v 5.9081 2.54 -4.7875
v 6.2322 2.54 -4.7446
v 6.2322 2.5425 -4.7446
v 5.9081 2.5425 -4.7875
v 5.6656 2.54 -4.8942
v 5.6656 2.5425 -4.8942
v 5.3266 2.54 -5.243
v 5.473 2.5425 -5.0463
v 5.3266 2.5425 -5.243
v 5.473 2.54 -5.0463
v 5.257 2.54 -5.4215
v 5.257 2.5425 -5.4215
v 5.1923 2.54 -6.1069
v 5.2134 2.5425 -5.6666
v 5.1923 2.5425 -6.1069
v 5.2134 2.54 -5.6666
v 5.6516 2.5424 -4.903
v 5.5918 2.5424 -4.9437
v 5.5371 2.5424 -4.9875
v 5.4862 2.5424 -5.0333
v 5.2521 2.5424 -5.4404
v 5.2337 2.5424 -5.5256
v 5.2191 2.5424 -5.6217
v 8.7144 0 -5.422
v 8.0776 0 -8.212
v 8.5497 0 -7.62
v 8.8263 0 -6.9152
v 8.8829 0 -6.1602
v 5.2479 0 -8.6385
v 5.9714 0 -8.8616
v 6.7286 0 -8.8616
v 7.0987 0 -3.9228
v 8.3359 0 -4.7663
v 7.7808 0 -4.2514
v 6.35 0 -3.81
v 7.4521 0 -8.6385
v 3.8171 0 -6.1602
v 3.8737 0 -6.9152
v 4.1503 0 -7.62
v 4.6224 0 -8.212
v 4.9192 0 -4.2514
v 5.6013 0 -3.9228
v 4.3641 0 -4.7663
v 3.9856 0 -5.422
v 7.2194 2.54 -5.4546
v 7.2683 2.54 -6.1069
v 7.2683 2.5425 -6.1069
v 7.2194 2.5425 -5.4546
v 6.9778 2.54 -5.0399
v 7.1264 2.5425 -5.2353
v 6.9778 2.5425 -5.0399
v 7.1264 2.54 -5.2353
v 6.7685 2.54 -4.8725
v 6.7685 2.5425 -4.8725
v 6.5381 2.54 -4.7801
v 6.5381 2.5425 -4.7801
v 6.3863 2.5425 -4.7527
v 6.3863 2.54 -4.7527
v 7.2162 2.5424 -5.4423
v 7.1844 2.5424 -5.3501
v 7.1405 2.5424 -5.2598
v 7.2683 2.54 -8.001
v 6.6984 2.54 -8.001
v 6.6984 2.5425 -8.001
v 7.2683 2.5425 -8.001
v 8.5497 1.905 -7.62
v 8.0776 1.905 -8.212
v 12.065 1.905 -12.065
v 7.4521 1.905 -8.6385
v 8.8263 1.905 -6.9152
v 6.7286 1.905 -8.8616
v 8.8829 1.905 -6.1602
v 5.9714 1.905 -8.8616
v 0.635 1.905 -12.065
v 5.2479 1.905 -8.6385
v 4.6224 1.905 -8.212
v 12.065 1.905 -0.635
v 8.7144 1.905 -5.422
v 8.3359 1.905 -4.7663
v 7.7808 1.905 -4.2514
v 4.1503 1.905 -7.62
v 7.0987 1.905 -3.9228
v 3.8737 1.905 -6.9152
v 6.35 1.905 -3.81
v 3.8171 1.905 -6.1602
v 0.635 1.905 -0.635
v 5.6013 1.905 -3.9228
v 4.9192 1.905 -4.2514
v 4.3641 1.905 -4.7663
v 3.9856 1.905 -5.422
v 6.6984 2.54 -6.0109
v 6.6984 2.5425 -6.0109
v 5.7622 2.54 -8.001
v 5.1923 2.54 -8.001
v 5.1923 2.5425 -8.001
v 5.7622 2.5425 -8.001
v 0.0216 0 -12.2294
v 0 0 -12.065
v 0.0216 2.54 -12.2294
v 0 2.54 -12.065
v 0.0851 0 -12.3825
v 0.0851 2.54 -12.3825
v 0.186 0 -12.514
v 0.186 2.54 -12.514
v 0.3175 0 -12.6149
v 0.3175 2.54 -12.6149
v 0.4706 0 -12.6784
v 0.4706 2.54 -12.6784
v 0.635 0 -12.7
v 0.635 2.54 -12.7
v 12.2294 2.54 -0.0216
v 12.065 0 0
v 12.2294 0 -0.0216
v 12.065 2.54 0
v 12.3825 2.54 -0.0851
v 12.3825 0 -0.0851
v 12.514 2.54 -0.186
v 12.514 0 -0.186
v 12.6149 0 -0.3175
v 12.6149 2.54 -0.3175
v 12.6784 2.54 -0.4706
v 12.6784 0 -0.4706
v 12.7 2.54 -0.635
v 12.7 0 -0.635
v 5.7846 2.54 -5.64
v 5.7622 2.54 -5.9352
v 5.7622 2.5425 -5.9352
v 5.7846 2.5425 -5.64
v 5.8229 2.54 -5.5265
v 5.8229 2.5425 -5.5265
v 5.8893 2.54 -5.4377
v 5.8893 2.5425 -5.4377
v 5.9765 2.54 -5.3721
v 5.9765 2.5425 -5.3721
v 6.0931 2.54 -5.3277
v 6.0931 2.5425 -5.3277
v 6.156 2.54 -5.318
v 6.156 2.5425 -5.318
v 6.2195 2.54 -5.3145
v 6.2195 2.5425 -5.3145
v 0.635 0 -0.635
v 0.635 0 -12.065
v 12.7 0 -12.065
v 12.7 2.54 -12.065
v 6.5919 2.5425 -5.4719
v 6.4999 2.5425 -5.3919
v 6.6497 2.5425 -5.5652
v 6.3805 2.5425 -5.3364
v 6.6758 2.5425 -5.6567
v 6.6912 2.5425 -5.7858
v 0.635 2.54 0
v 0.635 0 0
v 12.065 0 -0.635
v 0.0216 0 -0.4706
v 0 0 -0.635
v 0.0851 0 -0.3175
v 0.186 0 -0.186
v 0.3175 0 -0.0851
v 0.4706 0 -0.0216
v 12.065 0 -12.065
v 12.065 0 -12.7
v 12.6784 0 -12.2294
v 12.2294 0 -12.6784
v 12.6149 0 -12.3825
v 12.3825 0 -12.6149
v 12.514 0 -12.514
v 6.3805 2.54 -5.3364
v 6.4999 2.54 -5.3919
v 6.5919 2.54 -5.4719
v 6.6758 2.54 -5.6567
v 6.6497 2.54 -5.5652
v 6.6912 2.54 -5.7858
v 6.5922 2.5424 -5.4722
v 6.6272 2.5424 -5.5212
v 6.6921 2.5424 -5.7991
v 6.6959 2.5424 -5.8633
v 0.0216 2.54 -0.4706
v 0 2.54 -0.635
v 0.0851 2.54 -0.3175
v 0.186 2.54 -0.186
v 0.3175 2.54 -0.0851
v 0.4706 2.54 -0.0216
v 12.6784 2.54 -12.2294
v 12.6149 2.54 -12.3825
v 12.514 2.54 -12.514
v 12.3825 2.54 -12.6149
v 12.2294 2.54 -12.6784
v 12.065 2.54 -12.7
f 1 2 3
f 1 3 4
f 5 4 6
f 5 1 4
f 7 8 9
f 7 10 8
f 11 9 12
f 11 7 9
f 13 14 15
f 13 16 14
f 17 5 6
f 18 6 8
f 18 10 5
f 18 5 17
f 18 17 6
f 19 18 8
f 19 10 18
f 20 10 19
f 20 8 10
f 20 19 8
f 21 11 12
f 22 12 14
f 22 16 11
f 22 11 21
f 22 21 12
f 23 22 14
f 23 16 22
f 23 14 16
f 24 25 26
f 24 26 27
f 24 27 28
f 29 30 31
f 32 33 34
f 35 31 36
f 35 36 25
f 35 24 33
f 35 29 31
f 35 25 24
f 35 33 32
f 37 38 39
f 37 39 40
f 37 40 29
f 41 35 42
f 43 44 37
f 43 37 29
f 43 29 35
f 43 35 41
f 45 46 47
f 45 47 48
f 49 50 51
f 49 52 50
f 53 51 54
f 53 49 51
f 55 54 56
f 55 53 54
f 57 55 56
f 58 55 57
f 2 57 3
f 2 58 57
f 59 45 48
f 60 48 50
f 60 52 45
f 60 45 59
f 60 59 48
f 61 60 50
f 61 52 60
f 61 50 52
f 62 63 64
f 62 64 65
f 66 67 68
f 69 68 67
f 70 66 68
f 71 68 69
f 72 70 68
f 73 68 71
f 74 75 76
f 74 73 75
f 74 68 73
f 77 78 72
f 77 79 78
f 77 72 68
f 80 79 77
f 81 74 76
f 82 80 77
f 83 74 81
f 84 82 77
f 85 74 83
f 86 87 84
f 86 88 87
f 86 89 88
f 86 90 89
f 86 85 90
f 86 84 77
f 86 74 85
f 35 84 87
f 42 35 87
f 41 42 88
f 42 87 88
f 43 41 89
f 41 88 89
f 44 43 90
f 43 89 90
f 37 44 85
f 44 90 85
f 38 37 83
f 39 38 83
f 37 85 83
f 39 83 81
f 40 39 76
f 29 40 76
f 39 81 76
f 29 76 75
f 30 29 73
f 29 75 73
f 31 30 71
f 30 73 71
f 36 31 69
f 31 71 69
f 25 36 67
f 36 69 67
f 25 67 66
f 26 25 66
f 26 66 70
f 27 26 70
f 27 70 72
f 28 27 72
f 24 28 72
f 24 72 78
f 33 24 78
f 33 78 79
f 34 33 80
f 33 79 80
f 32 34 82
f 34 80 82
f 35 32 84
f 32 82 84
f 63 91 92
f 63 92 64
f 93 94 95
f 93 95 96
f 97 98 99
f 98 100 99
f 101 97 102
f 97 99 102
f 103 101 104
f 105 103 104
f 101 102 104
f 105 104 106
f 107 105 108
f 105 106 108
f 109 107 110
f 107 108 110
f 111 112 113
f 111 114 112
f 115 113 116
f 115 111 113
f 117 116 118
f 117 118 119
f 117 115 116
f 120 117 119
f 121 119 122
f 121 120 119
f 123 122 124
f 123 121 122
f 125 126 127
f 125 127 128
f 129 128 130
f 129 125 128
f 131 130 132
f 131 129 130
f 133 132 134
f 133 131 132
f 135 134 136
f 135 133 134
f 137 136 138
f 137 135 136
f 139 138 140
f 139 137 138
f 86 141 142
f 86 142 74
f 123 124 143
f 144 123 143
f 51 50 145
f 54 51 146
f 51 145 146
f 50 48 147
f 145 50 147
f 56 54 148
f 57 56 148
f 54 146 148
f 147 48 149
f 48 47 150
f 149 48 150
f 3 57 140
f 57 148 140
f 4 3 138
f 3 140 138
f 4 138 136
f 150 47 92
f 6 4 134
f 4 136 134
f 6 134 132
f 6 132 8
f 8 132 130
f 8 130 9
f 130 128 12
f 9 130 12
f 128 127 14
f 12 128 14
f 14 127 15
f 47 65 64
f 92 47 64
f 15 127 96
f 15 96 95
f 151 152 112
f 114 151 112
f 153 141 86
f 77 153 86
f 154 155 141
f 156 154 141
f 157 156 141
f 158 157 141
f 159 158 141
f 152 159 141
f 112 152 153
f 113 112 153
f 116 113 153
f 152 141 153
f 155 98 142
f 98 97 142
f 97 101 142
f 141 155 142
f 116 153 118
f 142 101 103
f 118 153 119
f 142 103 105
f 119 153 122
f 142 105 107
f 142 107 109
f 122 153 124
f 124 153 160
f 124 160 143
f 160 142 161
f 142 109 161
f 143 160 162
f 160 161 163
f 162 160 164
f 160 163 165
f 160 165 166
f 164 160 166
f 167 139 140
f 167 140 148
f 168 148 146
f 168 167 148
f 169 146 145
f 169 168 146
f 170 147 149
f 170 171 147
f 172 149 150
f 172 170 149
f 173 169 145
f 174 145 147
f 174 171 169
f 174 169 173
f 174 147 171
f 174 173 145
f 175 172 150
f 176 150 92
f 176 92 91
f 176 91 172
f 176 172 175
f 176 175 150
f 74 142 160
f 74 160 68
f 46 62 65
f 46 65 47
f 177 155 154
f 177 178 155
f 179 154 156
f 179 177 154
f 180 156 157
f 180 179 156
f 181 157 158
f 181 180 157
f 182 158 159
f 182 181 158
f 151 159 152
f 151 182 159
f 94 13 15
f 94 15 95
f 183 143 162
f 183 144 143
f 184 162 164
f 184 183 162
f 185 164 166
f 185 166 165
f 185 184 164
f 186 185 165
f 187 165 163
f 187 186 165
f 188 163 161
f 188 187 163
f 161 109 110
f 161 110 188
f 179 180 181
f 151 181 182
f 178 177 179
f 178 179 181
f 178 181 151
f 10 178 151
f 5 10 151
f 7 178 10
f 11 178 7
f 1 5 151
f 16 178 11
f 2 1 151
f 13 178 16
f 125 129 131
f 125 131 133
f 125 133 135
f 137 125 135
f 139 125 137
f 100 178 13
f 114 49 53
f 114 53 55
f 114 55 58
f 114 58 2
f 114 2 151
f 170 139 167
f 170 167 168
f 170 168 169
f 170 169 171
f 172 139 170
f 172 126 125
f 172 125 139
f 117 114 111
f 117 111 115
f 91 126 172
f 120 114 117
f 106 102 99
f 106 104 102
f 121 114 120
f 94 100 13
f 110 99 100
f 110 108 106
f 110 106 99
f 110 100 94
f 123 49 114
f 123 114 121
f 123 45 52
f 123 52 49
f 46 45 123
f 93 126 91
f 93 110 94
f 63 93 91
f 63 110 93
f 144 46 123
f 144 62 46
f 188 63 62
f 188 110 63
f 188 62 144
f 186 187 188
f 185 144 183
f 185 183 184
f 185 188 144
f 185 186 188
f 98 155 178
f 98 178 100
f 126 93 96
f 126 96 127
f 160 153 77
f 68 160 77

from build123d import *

# Parameters (mm, degrees)
SKETCH1_W           = 12.7
SKETCH1_H           = 12.7
BOSS_EXTRUDE1_DEPTH = 2.54
FILLET1_R           = 0.635
SHELL1_START        = 0.635
SHELL1_OUTLINE_W    = 1.905
SHELL1_OUTLINE_H    = 11.43
SHELL1_DEPTH        = 11.43
SKETCH2_R           = 2.54
BOSS_EXTRUDE2_DEPTH = 1.905
BOSS_EXTRUDE3_DEPTH = 0.00254


# Read off the part's stored shape, not the designer's step: Shell1
with BuildPart() as part:
    # Sketch1 → Boss-Extrude1 (new body)
    with BuildSketch(Plane(origin=(0, 0, 0), x_dir=(1, 0, 0), z_dir=(0, 1, 0))):
        with Locations((6.35, 6.35)):
            Rectangle(SKETCH1_W, SKETCH1_H)
    extrude(amount=BOSS_EXTRUDE1_DEPTH)

    # Fillet1
    fillet1_edges = [part.edges().sort_by_distance(p)[0] for p in [
        (0, 1.27, -12.7),
        (12.7, 1.27, -12.7),
        (12.7, 1.27, 0),
        (0, 1.27, 0),
    ]]
    fillet(fillet1_edges, radius=FILLET1_R)

    # Shell1 outline → Shell1 (cut)
    with BuildSketch(Plane.YZ.offset(SHELL1_START)):
        with Locations((0.9525, -6.35)):
            Rectangle(SHELL1_OUTLINE_W, SHELL1_OUTLINE_H)
    extrude(amount=SHELL1_DEPTH, mode=Mode.SUBTRACT)

    # Sketch2 → Boss-Extrude2 (add)
    with BuildSketch(Plane(origin=(0, 1.905, 0), x_dir=(-1, 0, 0), z_dir=(0, -1, 0))):
        with Locations(Location((-6.35, 6.35, 0), (0, 0, 270))):
            Circle(SKETCH2_R)
    extrude(amount=BOSS_EXTRUDE2_DEPTH)

    # Sketch3 → Boss-Extrude3 (add)
    with BuildSketch(Plane(origin=(0, 2.54, 0), x_dir=(1, 0, 0), z_dir=(0, 1, 0))):
        with BuildLine():
            Line((5.192346154, 8.001), (5.762217949, 8.001))
            Line((5.762217949, 8.001), (5.762217949, 5.935214744))
            add(Edge.make_bspline(
                [(5.762217949, 5.935214744), (5.762248936, 5.913797578), (5.762308786, 5.872430544), (5.765304944, 5.813082394), (5.768046636, 5.758529018), (5.772993425, 5.70883014), (5.780301528, 5.663964501), (5.787378157, 5.6236439), (5.796955674, 5.588590232), (5.811349151, 5.54868998), (5.833524775, 5.503859868), (5.869758513, 5.457136896), (5.911569146, 5.414495403), (5.961681599, 5.37900224), (6.018003565, 5.35029147), (6.080225578, 5.329019967), (6.148259929, 5.317195835), (6.195301951, 5.315390665), (6.219514623, 5.314461538)],
                knots=[0, 0, 0, 0, 1.155499968, 2.231836252, 3.205919964, 4.102923608, 4.924856345, 5.658536265, 6.31071849, 6.882491295, 7.94666036, 8.992281882, 10.060072772, 11.158554251, 12.289267114, 13.461410017, 14.693379945, 16, 16, 16, 16], degree=3))
            add(Edge.make_bspline(
                [(6.219514623, 5.314461538), (6.2452376, 5.315212154), (6.29539305, 5.316675726), (6.367533681, 5.331042272), (6.434372384, 5.353918735), (6.494493956, 5.386569277), (6.547838568, 5.425706674), (6.592993664, 5.47033557), (6.628629899, 5.520544979), (6.651856272, 5.566866983), (6.664896736, 5.609502353), (6.674671214, 5.647595439), (6.681836988, 5.692541509), (6.688338013, 5.743638634), (6.692244628, 5.801416082), (6.696480716, 5.865409199), (6.698033281, 5.936055843), (6.698297904, 5.985248427), (6.698435897, 6.010900841)],
                knots=[0, 0, 0, 0, 1.261321664, 2.459363699, 3.594844139, 4.716940403, 5.803436589, 6.833651888, 7.818396249, 8.814403945, 9.360733334, 10.004355033, 10.743453831, 11.592799886, 12.532235708, 13.585170094, 14.740740724, 16, 16, 16, 16], degree=3))
            Line((6.698435897, 6.010900841), (6.698435897, 8.001))
            Line((6.698435897, 8.001), (7.268307692, 8.001))
            Line((7.268307692, 8.001), (7.268307692, 6.106939503))
            add(Edge.make_bspline(
                [(7.268307692, 6.106939503), (7.268228555, 6.068565928), (7.268076382, 5.994777286), (7.265739466, 5.888737813), (7.260764595, 5.791887765), (7.256586276, 5.704198842), (7.2484998, 5.625789174), (7.240075588, 5.55632393), (7.229338205, 5.49604928), (7.213361625, 5.427433916), (7.185790778, 5.348425837), (7.141342957, 5.257451459), (7.084919326, 5.168382033), (7.018229414, 5.082197383), (6.942930403, 5.00213462), (6.860691833, 4.931849878), (6.772820271, 4.872396565), (6.678397522, 4.825228387), (6.577503944, 4.788440763), (6.469141271, 4.763721333), (6.353383397, 4.747020576), (6.273427246, 4.745416263), (6.232234976, 4.744589744)],
                knots=[0, 0, 0, 0, 1.170808336, 2.251350247, 3.235597562, 4.129743112, 4.929140599, 5.639994148, 6.264258765, 6.79612947, 7.788252245, 8.809469599, 9.879094798, 10.999557536, 12.129761673, 13.226370002, 14.293821979, 15.358369427, 16.438775801, 17.562147481, 18.744053101, 20, 20, 20, 20], degree=3))
            add(Edge.make_bspline(
                [(6.232234976, 4.744589744), (6.204866012, 4.745050738), (6.150867608, 4.745960269), (6.071453481, 4.753979964), (5.994684128, 4.765797979), (5.920703797, 4.783039245), (5.849255717, 4.80531174), (5.780358869, 4.832727631), (5.714269291, 4.865133995), (5.65135681, 4.902232764), (5.591698847, 4.942348696), (5.537174548, 4.986818895), (5.485907605, 5.032354622), (5.439379097, 5.080872214), (5.397239555, 5.131862319), (5.359575764, 5.185440497), (5.326443681, 5.24160199), (5.297009886, 5.301359104), (5.27181743, 5.367749078), (5.250579243, 5.443133431), (5.232025064, 5.528693737), (5.218236692, 5.624622759), (5.205736074, 5.730604326), (5.197823871, 5.846914536), (5.193684642, 5.973556726), (5.19280359, 6.061355131), (5.192346154, 6.106939503)],
                knots=[0, 0, 0, 0, 1.001158378, 1.975264943, 2.917723546, 3.841610987, 4.75185031, 5.653588123, 6.552117133, 7.442167995, 8.324307438, 9.179605724, 10.014504199, 10.831958861, 11.636465792, 12.43274043, 13.225645099, 14.020104002, 14.867201867, 15.819789774, 16.883317127, 18.068162734, 19.364263498, 20.787406516, 22.332041935, 24, 24, 24, 24], degree=3))
            Line((5.192346154, 6.106939503), (5.192346154, 8.001))
        make_face()
    extrude(amount=BOSS_EXTRUDE3_DEPTH)


solid = part.part
